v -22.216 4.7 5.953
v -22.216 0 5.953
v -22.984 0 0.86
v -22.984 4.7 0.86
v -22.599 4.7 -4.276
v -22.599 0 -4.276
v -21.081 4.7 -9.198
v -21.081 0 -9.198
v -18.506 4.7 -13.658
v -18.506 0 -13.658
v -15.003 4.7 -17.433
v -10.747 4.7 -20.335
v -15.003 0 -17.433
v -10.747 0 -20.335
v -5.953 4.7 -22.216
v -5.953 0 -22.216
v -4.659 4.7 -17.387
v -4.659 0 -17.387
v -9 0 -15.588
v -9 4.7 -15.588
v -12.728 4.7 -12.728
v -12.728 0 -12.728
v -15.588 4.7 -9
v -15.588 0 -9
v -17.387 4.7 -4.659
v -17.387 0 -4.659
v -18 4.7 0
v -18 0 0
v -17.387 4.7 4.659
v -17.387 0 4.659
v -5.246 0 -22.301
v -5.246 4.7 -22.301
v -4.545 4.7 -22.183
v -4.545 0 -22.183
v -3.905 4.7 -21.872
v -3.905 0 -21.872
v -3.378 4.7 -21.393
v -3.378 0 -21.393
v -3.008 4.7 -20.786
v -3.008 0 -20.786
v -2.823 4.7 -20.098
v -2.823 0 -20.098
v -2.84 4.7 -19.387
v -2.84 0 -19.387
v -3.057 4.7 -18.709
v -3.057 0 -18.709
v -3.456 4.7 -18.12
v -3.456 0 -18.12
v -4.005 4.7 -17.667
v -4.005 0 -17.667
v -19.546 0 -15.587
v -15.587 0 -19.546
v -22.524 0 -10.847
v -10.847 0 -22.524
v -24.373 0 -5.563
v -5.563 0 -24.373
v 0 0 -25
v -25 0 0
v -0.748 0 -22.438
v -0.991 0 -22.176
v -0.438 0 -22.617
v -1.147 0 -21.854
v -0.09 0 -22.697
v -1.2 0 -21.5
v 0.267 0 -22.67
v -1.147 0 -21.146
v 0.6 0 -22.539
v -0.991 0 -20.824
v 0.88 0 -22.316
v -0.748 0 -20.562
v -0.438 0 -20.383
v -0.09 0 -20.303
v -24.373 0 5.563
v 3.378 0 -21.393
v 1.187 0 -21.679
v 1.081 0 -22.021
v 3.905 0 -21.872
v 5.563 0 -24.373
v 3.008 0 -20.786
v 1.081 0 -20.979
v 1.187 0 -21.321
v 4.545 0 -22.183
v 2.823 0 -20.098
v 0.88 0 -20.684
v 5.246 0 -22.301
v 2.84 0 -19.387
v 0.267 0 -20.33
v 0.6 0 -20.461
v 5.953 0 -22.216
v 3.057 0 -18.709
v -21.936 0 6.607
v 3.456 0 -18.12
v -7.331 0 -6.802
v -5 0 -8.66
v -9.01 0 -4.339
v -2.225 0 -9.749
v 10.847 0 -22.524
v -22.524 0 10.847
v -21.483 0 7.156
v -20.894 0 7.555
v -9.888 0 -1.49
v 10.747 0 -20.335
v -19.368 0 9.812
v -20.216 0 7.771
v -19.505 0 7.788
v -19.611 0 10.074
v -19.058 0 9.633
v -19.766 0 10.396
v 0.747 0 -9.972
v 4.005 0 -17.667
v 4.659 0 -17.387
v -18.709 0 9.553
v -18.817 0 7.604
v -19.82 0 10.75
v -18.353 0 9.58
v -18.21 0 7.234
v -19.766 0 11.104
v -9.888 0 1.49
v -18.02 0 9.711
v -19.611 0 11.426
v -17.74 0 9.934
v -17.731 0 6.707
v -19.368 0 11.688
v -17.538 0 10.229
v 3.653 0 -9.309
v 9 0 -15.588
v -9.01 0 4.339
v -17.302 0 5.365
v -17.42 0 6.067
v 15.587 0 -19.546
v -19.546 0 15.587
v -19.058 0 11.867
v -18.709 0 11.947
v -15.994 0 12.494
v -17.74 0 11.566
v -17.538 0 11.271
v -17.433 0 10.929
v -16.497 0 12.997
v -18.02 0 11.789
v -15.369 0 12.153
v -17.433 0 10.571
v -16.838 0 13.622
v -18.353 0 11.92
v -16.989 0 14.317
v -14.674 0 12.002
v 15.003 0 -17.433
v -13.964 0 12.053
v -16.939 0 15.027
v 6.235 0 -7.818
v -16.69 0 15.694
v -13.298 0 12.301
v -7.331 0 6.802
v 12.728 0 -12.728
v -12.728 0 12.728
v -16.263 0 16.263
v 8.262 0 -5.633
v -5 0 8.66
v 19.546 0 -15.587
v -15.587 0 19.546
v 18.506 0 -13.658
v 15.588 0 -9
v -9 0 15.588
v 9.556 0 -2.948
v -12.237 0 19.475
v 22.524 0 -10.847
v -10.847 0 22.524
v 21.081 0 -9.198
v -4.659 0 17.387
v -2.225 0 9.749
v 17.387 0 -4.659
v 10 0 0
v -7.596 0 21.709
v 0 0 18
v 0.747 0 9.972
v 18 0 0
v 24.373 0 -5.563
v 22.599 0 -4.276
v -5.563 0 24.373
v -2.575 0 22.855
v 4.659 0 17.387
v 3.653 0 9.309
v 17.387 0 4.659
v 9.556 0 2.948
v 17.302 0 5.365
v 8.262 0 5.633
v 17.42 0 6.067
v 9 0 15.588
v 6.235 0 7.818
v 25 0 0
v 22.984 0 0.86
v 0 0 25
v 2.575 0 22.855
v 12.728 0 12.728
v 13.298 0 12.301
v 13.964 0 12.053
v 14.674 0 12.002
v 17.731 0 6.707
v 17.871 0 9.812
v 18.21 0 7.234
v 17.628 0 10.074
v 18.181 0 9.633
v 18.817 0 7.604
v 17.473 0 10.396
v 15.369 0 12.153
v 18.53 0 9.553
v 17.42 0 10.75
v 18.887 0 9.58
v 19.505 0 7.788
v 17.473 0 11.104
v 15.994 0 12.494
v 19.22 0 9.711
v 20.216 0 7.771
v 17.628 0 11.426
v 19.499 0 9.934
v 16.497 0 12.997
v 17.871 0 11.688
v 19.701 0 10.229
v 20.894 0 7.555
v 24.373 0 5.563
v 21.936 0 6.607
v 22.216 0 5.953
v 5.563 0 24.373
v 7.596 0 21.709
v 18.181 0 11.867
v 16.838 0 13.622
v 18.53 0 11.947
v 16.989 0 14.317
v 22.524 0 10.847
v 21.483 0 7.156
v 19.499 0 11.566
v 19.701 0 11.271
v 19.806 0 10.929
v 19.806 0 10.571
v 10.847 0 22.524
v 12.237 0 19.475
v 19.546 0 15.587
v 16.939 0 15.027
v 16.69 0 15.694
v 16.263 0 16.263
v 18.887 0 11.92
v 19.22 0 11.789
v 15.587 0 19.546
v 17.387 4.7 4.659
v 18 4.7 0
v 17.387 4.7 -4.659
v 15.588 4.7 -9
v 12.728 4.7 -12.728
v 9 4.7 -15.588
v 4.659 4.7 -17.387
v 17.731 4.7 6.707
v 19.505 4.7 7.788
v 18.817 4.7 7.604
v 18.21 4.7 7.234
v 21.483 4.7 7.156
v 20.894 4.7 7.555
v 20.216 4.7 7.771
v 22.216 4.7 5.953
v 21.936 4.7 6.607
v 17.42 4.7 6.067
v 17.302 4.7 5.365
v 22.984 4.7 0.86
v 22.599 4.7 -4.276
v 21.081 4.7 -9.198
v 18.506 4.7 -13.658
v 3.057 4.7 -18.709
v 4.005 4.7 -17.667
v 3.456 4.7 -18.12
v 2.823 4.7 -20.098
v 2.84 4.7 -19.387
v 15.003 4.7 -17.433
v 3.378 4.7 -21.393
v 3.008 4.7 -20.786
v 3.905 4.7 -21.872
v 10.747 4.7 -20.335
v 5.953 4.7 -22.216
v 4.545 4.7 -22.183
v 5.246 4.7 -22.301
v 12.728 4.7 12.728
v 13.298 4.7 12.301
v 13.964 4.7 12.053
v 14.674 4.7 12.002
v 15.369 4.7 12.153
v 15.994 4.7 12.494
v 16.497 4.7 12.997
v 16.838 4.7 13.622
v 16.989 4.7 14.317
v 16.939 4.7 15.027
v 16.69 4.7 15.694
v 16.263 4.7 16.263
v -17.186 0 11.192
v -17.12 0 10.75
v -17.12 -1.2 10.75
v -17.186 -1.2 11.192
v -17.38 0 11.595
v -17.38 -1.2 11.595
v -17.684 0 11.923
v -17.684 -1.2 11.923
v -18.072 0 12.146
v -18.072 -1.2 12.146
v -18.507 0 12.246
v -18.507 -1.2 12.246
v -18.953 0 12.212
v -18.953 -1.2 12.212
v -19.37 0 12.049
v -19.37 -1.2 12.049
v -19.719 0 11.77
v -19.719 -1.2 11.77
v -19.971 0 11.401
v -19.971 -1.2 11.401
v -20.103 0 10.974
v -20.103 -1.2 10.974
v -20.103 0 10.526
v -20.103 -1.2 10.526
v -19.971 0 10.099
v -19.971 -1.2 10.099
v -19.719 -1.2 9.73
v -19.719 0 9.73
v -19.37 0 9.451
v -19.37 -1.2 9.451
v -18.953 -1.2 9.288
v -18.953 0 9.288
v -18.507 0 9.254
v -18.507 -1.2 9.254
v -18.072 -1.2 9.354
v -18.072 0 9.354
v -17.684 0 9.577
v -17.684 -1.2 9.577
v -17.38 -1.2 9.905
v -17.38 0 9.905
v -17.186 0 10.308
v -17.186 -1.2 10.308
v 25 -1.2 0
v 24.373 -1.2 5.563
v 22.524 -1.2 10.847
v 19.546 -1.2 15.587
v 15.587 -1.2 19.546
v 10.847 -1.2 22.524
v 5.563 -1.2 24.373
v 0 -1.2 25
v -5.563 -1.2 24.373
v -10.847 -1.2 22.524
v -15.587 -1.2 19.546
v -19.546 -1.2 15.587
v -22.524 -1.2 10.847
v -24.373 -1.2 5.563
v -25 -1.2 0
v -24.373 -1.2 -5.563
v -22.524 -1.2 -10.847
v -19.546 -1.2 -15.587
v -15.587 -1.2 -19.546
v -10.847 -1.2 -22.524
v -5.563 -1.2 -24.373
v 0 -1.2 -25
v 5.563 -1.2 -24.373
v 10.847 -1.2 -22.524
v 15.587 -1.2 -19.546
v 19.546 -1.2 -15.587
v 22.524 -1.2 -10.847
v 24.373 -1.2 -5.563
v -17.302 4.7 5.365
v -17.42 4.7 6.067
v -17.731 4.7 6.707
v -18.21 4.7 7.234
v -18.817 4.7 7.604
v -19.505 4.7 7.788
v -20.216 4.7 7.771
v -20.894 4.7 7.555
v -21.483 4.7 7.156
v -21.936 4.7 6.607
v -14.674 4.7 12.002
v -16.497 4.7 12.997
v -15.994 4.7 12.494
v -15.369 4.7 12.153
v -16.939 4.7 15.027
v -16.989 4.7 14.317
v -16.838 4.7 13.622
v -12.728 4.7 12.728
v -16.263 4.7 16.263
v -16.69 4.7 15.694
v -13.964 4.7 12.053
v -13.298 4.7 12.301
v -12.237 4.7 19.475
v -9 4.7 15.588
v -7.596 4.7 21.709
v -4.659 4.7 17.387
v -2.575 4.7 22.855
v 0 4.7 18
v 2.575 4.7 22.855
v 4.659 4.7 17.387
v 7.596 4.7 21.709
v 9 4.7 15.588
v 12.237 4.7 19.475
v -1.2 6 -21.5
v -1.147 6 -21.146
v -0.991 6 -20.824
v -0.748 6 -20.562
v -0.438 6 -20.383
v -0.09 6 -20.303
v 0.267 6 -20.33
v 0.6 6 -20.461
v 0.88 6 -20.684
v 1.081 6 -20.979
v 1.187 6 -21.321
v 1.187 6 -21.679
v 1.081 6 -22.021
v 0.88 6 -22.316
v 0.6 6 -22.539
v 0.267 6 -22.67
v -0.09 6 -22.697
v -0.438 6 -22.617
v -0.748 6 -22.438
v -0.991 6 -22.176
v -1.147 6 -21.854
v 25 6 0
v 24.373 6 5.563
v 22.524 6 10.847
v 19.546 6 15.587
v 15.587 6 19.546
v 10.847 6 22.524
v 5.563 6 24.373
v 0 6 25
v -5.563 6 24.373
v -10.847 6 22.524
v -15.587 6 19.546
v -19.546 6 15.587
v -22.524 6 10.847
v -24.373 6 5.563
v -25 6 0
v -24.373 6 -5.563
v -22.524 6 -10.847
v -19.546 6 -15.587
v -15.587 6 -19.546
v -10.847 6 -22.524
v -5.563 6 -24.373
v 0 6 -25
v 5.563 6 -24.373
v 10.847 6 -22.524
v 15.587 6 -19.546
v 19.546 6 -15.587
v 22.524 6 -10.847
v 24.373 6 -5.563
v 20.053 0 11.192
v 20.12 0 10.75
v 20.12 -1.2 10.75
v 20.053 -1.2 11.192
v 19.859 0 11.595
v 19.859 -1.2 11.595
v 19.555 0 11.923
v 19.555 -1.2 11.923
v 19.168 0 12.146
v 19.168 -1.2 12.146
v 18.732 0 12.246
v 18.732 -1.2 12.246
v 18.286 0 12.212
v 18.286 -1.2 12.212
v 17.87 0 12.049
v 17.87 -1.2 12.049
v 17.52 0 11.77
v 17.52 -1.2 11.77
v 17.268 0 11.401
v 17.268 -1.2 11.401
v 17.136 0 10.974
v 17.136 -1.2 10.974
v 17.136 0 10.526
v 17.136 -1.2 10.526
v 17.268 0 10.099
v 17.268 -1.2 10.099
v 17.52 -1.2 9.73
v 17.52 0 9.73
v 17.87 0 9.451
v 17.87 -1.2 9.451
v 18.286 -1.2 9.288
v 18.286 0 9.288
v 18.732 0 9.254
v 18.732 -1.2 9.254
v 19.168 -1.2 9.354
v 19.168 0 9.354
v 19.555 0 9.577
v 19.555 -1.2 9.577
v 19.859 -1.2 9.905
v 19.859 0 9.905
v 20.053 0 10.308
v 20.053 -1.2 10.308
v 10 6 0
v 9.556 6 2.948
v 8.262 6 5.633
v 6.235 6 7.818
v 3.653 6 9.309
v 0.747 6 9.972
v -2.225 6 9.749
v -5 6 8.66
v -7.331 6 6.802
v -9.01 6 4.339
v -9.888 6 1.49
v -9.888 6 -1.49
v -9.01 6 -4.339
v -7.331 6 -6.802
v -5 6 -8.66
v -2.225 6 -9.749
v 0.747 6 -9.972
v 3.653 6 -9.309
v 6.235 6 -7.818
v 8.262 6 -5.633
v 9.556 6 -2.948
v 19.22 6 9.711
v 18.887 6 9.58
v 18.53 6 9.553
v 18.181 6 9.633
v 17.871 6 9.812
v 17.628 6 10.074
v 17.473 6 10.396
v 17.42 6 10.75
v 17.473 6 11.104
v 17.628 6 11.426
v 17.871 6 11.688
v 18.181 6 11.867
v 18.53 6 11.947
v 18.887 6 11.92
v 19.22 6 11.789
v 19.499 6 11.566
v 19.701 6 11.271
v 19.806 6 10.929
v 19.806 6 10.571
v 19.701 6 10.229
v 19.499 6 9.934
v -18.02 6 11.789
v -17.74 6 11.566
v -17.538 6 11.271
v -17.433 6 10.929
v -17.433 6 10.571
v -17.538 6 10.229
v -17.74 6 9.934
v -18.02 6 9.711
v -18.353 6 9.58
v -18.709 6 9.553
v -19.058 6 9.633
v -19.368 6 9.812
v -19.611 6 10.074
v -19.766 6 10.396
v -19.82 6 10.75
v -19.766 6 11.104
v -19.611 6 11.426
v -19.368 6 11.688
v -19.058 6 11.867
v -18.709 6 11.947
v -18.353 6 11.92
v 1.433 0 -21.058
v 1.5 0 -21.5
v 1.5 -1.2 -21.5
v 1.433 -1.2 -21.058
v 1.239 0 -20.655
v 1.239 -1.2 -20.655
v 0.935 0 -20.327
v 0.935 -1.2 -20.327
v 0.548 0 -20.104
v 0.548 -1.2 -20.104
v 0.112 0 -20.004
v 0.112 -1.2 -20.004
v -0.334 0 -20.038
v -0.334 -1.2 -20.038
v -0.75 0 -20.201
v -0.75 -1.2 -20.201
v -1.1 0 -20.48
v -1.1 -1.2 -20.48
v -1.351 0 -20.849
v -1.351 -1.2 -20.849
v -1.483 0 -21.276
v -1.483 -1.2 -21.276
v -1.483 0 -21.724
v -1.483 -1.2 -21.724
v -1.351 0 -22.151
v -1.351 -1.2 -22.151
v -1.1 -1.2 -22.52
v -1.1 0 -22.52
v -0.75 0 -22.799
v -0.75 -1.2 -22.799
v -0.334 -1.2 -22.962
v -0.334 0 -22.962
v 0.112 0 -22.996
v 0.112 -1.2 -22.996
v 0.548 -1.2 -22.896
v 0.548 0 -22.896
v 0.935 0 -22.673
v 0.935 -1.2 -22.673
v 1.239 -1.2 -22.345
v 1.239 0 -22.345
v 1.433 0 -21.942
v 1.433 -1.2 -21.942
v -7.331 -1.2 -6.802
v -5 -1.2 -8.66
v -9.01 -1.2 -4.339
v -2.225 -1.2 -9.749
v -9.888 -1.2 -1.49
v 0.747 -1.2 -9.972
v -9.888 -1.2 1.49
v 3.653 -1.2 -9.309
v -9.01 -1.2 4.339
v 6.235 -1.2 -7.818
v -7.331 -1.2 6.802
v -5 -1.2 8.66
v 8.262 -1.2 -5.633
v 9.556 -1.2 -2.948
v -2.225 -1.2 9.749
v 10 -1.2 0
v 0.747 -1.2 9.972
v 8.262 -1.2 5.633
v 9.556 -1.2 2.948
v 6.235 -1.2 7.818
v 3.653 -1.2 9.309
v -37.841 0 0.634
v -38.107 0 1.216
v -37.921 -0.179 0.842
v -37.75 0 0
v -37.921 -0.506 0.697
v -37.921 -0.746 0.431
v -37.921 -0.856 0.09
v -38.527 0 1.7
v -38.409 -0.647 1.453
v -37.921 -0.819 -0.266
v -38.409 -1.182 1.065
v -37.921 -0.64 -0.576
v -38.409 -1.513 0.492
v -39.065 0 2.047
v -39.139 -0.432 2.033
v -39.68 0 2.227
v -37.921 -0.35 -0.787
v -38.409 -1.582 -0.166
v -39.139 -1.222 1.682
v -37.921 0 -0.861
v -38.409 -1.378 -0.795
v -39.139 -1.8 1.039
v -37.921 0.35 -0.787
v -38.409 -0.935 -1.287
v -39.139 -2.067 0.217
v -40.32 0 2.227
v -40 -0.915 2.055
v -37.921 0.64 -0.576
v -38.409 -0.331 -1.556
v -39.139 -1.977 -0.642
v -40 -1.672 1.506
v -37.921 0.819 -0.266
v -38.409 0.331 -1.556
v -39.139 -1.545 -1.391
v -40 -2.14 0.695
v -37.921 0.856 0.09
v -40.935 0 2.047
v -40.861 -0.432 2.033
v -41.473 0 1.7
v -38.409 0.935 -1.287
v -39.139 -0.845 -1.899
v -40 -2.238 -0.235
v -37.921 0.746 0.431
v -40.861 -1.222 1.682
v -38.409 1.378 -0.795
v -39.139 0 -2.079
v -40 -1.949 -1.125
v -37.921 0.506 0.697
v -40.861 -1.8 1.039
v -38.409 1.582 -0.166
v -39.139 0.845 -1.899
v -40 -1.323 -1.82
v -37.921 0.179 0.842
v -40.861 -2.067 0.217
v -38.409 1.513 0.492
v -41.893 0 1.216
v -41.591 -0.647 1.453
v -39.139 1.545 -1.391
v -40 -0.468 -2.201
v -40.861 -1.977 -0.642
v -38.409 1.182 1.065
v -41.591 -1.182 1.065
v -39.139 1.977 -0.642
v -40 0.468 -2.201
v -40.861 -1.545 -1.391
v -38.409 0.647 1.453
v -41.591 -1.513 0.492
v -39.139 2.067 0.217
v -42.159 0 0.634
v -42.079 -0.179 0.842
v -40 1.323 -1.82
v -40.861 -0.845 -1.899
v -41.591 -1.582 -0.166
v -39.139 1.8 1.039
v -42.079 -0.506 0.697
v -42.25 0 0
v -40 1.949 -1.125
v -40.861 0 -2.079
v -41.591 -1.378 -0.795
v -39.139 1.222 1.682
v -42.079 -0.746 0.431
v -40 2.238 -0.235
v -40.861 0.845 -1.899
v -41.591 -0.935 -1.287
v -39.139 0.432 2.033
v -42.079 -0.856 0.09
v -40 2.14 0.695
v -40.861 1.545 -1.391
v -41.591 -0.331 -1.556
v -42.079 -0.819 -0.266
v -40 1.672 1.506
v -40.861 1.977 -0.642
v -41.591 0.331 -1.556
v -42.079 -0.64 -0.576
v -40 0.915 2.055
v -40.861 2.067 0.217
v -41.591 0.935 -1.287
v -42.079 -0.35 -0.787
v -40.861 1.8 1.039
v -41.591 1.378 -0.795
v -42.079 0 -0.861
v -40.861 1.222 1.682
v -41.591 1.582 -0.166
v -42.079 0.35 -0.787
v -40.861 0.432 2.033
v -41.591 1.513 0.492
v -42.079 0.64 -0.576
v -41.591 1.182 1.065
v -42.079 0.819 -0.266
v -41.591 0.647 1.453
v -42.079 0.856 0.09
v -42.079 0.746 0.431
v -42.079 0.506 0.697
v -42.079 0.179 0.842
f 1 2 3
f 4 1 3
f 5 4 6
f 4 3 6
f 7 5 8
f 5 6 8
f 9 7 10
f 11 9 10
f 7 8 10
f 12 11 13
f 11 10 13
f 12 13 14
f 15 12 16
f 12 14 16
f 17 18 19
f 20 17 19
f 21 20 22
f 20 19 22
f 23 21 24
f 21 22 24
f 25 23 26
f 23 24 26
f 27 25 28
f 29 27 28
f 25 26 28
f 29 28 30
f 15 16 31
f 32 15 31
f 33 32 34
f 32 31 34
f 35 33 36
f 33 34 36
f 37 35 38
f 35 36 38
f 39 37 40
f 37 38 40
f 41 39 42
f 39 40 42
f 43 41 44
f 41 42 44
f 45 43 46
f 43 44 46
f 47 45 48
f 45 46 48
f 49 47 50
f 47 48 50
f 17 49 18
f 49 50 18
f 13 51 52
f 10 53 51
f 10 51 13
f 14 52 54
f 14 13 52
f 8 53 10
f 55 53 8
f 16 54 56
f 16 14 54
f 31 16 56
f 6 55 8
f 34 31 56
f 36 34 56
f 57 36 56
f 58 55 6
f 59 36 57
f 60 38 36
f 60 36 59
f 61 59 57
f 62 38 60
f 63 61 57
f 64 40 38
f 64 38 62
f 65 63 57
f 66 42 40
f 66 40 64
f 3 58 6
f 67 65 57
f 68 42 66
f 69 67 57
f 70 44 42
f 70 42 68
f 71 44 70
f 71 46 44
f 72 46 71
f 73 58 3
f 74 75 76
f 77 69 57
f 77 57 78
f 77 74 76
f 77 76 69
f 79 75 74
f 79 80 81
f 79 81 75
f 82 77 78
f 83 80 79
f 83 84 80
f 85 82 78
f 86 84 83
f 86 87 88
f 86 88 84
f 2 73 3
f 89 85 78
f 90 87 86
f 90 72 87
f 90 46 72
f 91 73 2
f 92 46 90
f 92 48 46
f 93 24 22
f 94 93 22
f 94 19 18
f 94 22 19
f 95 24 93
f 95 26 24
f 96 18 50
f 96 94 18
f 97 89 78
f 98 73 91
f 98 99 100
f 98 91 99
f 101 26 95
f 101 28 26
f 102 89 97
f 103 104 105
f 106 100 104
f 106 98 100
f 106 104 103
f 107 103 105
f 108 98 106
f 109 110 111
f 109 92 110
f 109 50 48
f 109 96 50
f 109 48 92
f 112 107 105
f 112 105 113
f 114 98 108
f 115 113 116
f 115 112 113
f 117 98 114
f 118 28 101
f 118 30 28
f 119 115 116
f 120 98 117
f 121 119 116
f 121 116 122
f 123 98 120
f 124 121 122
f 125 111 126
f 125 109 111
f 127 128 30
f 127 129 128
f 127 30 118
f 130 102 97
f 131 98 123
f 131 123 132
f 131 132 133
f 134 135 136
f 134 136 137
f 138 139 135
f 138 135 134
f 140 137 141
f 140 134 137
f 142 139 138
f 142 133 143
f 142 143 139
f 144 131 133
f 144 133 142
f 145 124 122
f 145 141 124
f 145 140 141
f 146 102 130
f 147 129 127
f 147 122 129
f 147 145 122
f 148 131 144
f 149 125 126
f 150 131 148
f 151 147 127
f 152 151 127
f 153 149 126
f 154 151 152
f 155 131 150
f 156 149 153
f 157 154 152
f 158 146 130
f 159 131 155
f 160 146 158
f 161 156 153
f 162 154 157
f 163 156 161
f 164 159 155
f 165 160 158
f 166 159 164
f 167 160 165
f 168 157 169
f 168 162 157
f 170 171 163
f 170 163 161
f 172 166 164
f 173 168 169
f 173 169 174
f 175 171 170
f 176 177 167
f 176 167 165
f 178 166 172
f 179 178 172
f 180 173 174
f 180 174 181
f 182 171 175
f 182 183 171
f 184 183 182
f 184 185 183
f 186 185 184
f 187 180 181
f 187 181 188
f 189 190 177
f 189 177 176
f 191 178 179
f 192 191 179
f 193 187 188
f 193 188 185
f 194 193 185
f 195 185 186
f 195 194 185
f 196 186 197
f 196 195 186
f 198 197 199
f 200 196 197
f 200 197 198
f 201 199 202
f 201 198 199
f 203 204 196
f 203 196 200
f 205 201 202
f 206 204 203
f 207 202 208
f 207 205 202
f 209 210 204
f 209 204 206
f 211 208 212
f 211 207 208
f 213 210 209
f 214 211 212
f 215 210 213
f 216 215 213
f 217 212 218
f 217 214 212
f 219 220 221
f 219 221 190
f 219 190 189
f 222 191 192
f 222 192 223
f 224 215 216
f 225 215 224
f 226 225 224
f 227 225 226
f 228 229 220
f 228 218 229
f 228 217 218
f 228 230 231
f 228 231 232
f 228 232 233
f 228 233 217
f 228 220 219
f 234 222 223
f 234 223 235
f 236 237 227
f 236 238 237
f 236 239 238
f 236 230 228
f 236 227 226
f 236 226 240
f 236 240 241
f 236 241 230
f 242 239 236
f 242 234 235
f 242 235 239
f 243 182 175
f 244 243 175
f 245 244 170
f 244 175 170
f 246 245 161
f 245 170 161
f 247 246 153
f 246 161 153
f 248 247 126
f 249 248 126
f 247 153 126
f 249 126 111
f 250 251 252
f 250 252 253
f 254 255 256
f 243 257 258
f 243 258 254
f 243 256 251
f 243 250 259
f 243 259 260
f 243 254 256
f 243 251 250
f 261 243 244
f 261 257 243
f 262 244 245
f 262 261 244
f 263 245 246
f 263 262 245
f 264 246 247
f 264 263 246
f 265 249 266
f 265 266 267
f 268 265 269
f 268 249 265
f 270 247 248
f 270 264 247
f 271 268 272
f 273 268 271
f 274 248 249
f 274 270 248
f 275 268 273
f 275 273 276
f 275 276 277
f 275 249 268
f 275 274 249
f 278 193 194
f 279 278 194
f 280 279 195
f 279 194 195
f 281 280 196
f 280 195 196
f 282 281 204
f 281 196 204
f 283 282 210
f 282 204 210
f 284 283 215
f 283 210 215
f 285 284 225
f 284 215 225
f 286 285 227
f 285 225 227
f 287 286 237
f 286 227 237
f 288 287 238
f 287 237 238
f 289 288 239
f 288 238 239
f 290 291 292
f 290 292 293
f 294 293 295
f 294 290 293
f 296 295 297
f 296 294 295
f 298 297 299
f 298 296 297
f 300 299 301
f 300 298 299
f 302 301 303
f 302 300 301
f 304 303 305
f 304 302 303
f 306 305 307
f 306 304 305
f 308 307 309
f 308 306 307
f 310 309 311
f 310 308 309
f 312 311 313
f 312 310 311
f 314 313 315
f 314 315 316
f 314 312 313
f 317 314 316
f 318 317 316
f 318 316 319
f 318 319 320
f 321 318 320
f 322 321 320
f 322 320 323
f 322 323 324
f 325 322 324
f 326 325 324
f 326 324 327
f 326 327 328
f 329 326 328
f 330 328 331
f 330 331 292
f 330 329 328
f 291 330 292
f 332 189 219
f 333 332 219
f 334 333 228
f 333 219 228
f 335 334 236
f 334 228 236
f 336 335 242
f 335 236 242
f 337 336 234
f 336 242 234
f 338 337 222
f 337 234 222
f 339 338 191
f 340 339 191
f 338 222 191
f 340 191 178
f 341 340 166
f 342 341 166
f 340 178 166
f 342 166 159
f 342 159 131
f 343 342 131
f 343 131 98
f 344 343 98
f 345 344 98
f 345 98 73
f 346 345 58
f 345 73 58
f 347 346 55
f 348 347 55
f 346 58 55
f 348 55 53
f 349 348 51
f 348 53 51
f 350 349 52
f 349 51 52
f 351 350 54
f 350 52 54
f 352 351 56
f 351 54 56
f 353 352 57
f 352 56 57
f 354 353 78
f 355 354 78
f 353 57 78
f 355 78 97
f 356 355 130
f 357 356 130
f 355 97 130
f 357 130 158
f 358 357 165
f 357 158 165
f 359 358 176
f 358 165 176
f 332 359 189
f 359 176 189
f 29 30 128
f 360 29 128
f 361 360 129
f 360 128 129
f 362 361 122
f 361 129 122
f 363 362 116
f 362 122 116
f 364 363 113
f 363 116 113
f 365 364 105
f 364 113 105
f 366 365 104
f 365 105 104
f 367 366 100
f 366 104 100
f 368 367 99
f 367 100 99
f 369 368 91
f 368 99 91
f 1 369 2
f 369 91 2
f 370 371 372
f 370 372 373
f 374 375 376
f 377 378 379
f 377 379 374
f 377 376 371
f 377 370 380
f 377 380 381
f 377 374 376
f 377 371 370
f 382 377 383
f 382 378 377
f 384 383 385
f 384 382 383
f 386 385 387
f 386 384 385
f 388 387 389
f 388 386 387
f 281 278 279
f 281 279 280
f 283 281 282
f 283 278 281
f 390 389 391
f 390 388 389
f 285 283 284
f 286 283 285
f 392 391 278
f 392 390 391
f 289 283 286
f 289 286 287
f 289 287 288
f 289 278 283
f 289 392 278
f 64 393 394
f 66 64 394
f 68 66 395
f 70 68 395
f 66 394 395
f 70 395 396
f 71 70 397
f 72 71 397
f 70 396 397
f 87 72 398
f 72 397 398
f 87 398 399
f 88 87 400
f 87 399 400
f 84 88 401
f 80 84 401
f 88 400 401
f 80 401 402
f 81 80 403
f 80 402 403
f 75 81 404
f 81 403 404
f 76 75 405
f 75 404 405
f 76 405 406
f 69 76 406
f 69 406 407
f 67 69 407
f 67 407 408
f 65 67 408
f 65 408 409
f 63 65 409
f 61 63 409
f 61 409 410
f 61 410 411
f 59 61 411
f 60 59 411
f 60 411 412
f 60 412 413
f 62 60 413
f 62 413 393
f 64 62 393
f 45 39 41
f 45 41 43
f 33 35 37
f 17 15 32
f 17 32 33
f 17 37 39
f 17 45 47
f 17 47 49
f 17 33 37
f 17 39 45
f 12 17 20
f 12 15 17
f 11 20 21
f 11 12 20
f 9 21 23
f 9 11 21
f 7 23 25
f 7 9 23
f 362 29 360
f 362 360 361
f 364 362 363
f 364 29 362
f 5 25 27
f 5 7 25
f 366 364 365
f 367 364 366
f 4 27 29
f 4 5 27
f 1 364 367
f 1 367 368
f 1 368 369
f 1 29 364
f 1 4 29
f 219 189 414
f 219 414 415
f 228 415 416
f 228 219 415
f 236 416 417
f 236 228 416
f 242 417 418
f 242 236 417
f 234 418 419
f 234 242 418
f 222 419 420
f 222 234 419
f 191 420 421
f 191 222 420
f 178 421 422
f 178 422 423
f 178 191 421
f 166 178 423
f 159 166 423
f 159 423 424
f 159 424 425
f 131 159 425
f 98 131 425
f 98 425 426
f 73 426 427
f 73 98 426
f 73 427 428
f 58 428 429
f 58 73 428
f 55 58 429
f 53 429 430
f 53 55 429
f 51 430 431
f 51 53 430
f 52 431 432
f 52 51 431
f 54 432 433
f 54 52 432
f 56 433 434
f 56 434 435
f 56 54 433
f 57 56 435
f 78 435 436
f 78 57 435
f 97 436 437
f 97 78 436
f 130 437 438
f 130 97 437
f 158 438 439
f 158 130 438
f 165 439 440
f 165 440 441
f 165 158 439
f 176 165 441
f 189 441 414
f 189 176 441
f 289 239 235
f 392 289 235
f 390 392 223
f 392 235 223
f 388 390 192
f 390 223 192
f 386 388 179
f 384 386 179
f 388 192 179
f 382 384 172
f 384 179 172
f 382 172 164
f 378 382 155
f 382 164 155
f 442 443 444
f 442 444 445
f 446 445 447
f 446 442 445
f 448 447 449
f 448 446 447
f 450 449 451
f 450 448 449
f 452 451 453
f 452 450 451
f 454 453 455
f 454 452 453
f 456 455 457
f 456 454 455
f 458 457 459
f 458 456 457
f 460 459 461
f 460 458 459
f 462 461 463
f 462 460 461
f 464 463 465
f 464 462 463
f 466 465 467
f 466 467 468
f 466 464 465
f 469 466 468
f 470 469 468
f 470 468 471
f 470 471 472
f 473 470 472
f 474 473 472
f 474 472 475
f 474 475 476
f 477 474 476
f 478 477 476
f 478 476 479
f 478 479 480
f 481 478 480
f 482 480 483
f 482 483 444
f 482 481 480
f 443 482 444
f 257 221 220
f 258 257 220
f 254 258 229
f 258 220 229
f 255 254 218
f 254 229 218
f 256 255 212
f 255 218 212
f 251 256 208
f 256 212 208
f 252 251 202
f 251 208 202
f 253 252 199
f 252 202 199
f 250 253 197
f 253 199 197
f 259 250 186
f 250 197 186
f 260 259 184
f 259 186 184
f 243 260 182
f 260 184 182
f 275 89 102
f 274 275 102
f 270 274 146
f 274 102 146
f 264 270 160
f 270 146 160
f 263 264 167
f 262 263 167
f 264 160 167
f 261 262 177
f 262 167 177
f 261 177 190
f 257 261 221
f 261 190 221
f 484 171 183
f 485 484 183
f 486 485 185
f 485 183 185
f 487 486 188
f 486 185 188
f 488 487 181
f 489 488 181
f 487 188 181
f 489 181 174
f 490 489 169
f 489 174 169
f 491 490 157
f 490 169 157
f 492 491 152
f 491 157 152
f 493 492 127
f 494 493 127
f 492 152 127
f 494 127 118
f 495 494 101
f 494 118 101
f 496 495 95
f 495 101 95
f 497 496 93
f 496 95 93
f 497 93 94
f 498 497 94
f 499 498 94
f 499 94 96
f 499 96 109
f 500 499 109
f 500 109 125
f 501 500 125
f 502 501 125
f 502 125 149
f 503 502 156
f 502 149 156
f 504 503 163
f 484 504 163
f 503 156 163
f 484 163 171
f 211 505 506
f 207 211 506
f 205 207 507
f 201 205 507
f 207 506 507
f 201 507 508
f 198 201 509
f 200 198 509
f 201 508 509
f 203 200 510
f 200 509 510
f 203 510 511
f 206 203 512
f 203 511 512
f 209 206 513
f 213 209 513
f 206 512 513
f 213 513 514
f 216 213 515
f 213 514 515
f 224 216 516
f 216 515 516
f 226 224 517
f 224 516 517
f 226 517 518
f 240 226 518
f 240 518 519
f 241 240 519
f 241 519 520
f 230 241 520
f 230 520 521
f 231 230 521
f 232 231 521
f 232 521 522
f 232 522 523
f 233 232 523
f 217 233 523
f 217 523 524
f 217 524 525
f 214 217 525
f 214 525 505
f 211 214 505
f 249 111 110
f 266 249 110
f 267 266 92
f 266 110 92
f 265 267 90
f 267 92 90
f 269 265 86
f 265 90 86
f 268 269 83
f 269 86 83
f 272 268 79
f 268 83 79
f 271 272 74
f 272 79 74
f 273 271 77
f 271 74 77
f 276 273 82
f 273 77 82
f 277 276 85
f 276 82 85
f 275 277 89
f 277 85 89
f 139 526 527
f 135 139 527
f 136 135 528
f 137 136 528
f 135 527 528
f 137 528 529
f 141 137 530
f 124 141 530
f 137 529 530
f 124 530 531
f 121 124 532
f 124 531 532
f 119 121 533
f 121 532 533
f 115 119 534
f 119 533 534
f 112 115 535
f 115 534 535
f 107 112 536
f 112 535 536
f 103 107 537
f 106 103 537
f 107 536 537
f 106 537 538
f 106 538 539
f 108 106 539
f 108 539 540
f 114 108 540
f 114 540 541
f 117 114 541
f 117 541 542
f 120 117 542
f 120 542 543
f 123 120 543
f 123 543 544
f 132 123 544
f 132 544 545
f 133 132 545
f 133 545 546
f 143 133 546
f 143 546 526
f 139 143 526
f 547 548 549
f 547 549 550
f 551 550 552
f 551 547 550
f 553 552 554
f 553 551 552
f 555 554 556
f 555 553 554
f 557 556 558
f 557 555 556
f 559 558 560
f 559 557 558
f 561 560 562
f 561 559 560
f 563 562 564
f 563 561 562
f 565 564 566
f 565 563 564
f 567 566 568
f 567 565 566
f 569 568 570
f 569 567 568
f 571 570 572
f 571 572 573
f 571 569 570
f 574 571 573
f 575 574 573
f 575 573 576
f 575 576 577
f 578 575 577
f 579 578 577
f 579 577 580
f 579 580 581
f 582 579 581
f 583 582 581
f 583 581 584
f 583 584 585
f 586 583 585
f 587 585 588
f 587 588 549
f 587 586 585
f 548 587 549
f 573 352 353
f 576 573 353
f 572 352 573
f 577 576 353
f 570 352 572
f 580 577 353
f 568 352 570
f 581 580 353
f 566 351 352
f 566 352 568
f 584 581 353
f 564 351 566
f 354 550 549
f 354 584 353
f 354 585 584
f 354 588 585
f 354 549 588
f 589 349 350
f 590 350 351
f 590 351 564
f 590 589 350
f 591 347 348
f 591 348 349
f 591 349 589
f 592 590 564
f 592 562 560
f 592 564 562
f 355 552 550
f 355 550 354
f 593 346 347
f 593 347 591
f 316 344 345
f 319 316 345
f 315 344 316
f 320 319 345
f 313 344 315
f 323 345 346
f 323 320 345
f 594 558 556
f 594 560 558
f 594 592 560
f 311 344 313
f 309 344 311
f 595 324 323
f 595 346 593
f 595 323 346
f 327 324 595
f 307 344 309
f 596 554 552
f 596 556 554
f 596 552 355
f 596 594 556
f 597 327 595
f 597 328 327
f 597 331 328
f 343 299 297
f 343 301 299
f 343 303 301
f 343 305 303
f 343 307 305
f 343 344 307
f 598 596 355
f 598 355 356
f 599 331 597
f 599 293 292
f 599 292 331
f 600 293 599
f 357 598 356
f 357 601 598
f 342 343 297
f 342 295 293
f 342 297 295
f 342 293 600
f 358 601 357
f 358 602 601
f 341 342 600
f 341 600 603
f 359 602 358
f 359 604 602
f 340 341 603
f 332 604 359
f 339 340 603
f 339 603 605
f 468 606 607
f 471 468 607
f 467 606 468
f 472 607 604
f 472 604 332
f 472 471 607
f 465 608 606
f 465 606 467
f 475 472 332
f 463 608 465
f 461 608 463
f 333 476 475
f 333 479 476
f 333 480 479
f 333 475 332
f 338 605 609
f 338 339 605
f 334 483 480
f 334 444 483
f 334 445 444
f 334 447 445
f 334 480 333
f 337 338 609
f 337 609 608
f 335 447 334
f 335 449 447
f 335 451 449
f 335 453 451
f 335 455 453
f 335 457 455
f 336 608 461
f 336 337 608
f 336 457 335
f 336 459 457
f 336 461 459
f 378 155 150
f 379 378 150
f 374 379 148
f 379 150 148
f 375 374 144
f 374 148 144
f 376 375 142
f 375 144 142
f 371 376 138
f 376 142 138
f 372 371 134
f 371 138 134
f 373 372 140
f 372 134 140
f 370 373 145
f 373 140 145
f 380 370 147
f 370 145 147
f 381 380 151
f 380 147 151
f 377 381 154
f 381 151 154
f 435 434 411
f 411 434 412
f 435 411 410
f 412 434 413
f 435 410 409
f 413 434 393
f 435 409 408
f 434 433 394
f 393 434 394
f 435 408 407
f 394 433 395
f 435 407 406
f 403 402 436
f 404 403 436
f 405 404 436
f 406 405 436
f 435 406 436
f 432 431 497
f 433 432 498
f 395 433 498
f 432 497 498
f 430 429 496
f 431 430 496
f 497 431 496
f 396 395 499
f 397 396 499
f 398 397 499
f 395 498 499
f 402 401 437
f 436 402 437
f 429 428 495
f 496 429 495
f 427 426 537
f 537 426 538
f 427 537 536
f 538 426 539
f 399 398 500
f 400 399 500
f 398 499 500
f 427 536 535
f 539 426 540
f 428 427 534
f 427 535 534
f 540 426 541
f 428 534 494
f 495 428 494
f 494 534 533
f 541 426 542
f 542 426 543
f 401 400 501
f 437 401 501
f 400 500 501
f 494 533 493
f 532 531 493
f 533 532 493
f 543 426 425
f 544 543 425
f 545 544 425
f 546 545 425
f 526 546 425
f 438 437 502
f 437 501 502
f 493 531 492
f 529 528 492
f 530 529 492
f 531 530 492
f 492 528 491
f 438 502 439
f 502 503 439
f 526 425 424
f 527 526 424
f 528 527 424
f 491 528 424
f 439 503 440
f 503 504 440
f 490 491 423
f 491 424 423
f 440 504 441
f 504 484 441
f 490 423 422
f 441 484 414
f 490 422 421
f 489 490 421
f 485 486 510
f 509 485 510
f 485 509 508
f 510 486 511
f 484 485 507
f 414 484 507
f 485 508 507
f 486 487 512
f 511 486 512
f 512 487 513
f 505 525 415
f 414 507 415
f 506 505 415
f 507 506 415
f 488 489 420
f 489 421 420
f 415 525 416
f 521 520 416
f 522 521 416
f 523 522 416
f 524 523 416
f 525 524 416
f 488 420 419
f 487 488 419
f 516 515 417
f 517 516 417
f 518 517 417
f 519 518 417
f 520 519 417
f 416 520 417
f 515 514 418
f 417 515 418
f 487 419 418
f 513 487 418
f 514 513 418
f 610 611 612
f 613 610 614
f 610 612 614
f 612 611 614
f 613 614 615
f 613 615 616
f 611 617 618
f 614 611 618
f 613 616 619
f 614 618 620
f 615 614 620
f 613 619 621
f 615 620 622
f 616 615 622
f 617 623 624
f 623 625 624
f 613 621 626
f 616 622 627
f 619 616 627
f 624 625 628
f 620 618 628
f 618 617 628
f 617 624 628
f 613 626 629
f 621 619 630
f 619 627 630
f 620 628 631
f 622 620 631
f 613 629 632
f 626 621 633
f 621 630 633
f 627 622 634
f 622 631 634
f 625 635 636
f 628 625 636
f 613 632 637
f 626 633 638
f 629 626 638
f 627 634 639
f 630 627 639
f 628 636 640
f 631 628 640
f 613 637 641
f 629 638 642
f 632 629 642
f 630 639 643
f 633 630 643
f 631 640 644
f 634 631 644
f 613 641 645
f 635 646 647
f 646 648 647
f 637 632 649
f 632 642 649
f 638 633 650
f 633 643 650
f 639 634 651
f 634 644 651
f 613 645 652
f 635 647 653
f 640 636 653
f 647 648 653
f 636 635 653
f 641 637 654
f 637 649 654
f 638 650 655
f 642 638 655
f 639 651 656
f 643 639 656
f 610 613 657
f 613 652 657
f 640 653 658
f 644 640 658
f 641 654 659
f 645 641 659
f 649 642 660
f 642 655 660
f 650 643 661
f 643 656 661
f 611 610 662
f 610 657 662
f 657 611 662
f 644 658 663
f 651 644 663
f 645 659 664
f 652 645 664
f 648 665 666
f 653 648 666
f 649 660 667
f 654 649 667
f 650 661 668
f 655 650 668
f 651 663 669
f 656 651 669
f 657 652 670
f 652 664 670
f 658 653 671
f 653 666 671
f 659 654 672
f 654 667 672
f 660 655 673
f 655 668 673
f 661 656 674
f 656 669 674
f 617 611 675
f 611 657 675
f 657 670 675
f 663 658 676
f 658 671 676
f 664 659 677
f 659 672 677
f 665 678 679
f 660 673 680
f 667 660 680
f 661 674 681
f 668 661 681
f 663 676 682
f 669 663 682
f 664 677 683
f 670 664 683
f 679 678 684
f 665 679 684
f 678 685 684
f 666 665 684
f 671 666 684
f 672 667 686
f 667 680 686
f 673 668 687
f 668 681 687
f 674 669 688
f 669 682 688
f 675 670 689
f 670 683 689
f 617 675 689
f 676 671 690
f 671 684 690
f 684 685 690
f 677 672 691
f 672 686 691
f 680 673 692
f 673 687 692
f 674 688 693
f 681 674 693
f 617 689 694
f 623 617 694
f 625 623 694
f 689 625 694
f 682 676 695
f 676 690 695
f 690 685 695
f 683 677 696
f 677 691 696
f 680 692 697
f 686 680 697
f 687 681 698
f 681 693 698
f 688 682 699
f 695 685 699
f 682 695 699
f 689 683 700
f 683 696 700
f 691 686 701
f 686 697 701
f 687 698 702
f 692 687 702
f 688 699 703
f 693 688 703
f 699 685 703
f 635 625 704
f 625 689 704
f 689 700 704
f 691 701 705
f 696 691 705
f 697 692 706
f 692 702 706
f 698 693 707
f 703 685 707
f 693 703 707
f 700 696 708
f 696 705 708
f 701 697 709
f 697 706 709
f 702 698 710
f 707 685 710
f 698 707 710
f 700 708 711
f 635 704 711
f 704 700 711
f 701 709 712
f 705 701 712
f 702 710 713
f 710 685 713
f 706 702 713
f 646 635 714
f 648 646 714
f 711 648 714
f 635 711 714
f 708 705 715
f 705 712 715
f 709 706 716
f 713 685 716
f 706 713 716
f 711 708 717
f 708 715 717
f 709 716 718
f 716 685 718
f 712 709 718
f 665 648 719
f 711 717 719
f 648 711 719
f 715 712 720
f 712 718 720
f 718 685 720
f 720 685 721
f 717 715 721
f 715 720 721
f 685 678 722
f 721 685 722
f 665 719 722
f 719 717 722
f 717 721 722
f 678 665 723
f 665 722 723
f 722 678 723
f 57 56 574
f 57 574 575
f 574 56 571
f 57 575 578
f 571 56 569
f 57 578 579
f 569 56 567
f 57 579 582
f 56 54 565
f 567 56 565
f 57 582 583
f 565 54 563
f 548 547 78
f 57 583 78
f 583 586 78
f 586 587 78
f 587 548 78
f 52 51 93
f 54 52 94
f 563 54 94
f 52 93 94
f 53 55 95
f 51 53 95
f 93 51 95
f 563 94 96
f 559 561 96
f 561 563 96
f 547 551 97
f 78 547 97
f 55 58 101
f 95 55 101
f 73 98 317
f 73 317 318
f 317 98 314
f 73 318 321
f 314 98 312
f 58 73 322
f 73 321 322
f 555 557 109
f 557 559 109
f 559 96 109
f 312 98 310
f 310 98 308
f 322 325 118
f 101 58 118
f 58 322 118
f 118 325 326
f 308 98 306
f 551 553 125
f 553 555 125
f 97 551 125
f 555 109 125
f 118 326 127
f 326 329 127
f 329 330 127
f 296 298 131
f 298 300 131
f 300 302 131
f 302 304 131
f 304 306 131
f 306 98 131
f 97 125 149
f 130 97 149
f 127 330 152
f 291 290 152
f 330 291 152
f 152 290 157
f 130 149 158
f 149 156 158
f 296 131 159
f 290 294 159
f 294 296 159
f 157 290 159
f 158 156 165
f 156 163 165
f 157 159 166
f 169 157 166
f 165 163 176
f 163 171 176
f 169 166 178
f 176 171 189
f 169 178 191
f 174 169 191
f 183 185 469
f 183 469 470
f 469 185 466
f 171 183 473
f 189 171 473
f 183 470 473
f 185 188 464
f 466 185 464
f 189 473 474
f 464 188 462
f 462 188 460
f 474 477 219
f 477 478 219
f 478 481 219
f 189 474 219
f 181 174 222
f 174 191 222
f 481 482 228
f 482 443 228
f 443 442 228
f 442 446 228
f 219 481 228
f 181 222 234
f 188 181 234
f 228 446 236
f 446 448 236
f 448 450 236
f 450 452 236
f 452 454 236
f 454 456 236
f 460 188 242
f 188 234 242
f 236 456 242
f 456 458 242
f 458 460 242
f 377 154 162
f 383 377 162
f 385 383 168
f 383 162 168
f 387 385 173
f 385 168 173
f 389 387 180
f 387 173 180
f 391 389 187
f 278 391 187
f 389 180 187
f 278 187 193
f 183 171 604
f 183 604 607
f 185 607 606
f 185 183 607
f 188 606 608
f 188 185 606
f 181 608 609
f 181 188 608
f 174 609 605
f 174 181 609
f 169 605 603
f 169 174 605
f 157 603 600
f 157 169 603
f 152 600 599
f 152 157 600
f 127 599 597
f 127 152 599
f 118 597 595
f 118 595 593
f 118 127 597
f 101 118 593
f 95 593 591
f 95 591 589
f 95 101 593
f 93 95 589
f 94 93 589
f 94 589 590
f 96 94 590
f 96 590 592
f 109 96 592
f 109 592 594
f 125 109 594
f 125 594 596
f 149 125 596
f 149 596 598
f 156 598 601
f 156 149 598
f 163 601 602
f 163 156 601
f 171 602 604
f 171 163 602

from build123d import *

# Parameters (mm, degrees)
F0_R            = 25
F0_R_2          = 10
F1_DEPTH        = 6
F3_DEPTH        = 4.7
F3_COPIES_COUNT = 3
F5_D            = 2.4
F5_COPIES_COUNT = 3
F6_R            = 25
F6_R_2          = 1.5
F6_R_3          = 10
F7_DEPTH        = 1.2


# Not quite as in the source:
# - a pattern or mirror of a feature is missing from the dataset's text; its kind, count and spacing are read off the source's solid


with BuildPart() as f1:
    # F0 (on Front) → F1 (new body)
    with BuildSketch(Plane.XZ):
        Circle(F0_R)
        Circle(F0_R_2, mode=Mode.SUBTRACT)
    extrude(amount=-F1_DEPTH)

    # F2 (on face) → F3 (cut)
    with BuildSketch(Plane.XZ):
        with BuildLine():
            ThreePointArc((-16.2634559673, 16.2634559673), (-16.2634559673, 12.7279220614), (-12.7279220614, 12.7279220614))
            ThreePointArc((-12.7279220614, 12.7279220614), (0, 18), (12.7279220614, 12.7279220614))
            ThreePointArc((12.7279220614, 12.7279220614), (16.2634559673, 12.7279220614), (16.2634559673, 16.2634559673))
            ThreePointArc((16.2634559673, 16.2634559673), (0, 23), (-16.2634559673, 16.2634559673))
        make_face()
    f3 = extrude(amount=-F3_DEPTH, mode=Mode.SUBTRACT)

    # F3_copies: F3 ×3 about axis
    f3_copies_axis = Axis((0, 0, 0), (0, 1, 0))
    for i in range(1, F3_COPIES_COUNT):
        add(f3.rotate(f3_copies_axis, i * 360 / F3_COPIES_COUNT), mode=Mode.SUBTRACT)

    # F5 (through all)
    with Locations(Plane.XZ):
        with Locations((0, -21.5)):
            f5 = Hole(F5_D / 2)

    # F5_copies: F5 ×3 about axis
    f5_copies_axis = Axis((0, 0, 0), (0, 1, 0))
    for i in range(1, F5_COPIES_COUNT):
        add(f5.rotate(f5_copies_axis, i * 360 / F5_COPIES_COUNT), mode=Mode.SUBTRACT)


with BuildPart() as f7:
    # F6 (on face) → F7 (new body)
    with BuildSketch(Plane.XZ):
        Circle(F6_R)
        with Locations((0, -21.5)):
            Circle(F6_R_2, mode=Mode.SUBTRACT)
        with Locations((-18.6195461814, 10.75)):
            Circle(F6_R_2, mode=Mode.SUBTRACT)
        Circle(F6_R_3, mode=Mode.SUBTRACT)
        with Locations((18.6195461814, 10.75)):
            Circle(F6_R_2, mode=Mode.SUBTRACT)
    extrude(amount=F7_DEPTH)


with BuildPart() as f9:
    # F8 (on Front) → F9 (revolve)
    with BuildSketch(Plane.XZ):
        with BuildLine():
            Line((-42.25, 0), (-37.75, 0))
            ThreePointArc((-37.75, 0), (-40, 2.25), (-42.25, 0))
        make_face()
    revolve(axis=Axis((-40, 0, 0), (1, 0, 0)))


solid = Compound([f1.part, f7.part, f9.part])
